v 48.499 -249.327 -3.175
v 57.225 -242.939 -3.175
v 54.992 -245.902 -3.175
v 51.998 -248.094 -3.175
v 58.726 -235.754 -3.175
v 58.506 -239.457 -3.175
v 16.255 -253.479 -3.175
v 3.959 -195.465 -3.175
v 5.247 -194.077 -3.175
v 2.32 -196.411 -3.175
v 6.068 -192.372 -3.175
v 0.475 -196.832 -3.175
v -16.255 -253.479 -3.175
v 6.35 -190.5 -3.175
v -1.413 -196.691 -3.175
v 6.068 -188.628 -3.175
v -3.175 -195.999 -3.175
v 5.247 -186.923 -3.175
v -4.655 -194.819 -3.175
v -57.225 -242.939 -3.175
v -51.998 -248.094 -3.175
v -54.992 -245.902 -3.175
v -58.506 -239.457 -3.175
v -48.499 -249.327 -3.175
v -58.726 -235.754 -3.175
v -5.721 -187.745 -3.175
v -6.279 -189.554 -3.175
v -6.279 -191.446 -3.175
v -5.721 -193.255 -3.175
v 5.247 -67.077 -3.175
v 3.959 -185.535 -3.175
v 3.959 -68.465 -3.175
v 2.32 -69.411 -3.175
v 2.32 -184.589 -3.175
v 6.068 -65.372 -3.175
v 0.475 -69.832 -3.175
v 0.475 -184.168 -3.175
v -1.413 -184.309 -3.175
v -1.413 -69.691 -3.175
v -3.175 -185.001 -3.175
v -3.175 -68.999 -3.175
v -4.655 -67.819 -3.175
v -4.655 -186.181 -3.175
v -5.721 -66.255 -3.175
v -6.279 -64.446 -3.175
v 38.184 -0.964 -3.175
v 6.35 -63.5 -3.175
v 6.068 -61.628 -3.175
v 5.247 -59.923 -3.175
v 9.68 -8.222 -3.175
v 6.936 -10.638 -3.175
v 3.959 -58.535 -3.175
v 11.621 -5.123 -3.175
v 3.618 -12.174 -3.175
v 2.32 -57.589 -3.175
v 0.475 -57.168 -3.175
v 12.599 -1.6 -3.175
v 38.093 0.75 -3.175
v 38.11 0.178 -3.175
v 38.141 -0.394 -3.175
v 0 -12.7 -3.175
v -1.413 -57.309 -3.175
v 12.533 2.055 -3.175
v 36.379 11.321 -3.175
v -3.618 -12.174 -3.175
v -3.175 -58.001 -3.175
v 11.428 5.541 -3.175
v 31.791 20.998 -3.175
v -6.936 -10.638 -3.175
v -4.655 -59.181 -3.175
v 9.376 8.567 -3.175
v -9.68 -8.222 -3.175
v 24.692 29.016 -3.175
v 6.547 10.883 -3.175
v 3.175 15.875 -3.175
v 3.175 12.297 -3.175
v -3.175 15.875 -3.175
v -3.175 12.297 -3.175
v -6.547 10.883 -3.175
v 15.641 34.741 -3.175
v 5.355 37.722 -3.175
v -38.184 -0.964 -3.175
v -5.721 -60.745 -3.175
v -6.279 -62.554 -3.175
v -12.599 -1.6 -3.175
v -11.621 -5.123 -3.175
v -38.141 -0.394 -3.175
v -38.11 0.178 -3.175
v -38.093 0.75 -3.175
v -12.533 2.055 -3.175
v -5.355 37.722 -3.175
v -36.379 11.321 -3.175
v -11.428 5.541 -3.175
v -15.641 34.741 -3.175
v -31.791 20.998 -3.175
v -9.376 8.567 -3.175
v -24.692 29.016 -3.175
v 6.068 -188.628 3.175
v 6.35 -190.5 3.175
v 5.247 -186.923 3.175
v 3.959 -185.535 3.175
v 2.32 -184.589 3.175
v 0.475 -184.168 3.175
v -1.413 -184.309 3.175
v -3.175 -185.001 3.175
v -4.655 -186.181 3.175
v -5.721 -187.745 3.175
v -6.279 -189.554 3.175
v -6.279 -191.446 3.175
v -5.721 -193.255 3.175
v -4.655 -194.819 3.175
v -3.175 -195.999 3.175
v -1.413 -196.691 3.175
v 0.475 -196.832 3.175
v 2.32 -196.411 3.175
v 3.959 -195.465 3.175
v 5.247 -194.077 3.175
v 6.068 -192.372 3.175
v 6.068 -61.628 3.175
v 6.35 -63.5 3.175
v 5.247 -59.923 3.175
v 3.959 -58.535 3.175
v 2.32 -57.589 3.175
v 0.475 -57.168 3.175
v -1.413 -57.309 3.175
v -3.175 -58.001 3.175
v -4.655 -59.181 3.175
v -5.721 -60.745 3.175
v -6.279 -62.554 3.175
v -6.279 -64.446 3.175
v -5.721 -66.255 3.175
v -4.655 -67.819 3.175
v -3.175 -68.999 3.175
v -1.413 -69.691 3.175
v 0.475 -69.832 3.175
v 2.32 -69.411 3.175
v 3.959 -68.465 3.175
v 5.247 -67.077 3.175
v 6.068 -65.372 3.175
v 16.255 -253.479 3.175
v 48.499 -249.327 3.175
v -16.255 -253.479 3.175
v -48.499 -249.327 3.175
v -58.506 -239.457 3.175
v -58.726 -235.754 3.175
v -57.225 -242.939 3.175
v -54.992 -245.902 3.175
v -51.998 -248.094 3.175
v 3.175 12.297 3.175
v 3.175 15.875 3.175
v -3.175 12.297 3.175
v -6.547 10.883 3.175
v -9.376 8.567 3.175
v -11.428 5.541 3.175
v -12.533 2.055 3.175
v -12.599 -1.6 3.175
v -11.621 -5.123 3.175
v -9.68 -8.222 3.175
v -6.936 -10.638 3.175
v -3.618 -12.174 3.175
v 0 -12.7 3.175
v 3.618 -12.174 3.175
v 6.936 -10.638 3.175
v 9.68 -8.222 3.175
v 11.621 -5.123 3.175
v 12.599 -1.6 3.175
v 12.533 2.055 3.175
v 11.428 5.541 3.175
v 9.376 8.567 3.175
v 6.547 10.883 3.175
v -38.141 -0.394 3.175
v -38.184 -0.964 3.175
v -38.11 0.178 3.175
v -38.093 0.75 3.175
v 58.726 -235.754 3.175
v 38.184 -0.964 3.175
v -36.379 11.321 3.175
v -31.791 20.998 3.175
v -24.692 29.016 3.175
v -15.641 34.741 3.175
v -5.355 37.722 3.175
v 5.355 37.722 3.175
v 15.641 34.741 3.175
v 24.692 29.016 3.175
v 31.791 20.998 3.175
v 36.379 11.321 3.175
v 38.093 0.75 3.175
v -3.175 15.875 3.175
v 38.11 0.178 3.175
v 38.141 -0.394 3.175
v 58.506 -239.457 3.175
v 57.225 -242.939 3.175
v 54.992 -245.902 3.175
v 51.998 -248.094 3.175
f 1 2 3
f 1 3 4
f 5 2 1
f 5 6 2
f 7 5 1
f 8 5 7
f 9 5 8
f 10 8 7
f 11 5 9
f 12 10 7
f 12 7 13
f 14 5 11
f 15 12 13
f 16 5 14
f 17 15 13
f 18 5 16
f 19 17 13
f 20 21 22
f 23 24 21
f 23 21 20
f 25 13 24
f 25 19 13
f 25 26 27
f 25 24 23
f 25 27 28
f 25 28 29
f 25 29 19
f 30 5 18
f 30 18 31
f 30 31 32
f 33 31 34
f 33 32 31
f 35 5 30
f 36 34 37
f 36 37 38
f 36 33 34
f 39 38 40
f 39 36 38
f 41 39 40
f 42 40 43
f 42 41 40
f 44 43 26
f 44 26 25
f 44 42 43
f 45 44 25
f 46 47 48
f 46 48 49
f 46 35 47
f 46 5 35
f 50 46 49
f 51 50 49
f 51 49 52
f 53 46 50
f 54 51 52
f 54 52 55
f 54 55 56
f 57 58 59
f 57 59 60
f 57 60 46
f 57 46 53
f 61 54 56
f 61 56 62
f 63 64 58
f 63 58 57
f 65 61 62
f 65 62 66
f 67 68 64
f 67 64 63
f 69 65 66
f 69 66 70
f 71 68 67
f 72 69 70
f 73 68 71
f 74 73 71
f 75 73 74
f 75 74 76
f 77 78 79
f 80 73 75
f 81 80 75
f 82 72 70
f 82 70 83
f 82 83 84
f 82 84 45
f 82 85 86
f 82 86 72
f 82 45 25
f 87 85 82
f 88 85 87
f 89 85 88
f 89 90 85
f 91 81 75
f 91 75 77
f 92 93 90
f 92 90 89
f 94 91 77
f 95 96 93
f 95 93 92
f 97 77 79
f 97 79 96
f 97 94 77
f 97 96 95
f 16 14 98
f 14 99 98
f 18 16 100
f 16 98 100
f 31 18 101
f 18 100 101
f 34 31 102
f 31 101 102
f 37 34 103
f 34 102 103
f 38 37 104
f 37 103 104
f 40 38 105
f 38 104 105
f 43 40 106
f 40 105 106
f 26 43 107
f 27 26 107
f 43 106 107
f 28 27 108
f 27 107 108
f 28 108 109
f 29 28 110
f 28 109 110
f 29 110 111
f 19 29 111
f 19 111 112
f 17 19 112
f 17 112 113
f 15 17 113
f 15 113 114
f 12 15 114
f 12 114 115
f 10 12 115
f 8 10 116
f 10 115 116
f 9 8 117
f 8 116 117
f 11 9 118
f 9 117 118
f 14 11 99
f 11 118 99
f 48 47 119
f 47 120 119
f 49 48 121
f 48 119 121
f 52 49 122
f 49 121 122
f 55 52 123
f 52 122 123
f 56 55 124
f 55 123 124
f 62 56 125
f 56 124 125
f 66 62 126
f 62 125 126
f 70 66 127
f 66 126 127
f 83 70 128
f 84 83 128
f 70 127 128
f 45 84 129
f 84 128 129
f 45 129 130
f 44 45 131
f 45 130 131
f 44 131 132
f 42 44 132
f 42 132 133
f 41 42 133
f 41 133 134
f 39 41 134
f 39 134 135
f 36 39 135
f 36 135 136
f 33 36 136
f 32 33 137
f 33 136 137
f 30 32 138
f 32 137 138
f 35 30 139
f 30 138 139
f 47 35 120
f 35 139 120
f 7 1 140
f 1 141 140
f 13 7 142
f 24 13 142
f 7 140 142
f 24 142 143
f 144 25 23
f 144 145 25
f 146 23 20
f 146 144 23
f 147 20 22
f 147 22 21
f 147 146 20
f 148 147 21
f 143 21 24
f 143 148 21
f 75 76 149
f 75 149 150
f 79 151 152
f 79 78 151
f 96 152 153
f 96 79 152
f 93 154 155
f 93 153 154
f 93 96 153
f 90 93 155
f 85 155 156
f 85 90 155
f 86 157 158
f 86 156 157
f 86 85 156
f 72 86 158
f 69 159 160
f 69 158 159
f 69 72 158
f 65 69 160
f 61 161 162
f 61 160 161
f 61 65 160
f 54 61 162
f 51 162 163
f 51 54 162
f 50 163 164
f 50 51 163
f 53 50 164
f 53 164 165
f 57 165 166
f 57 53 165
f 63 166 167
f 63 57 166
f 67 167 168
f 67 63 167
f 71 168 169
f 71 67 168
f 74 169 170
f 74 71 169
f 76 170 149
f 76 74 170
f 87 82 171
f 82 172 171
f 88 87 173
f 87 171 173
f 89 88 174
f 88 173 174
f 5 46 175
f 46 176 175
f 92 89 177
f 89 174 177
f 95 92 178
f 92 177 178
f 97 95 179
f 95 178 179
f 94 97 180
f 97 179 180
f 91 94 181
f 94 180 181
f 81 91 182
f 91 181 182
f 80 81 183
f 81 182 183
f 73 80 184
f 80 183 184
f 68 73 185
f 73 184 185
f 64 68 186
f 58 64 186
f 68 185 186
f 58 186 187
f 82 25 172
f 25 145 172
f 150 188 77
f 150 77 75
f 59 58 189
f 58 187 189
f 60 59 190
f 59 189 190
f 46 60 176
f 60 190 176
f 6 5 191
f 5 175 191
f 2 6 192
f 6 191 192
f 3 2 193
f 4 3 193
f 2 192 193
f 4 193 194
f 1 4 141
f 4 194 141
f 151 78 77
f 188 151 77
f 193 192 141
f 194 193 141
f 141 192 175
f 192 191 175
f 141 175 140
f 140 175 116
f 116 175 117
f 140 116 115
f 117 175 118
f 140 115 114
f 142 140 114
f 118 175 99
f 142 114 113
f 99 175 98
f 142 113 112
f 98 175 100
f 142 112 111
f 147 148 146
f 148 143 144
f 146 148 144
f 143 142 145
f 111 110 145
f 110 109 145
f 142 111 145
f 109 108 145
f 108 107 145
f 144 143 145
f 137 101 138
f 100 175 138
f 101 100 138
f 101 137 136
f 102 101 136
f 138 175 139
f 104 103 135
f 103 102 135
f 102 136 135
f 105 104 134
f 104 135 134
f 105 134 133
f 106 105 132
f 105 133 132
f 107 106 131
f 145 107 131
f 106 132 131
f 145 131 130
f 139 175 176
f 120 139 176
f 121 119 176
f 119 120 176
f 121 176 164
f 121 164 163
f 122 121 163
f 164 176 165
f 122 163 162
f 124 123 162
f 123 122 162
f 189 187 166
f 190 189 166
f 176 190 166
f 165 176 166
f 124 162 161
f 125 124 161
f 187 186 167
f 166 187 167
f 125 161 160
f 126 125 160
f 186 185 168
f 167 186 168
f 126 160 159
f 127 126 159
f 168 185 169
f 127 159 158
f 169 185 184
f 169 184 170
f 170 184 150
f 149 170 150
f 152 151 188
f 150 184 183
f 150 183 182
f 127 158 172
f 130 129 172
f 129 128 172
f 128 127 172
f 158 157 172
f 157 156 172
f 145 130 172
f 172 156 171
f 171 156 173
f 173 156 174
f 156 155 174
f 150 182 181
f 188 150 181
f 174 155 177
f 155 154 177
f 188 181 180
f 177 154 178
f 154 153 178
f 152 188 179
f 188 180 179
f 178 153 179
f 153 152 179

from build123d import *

# Parameters (mm, degrees)
SKETCH1_R               = 12.7
BOSS_EXTRUDE1_DEPTH     = 3.175
SKETCH8_W               = 6.35
SKETCH8_H               = 6.35
CUT_EXTRUDE1_DEPTH      = 4.175
CUT_EXTRUDE1_DEPTH_BACK = 4.175
SKETCH9_R               = 6.35
CUT_EXTRUDE2_DEPTH      = 4.175
CUT_EXTRUDE2_DEPTH_BACK = 4.175
FILLET1_R               = 12.7


with BuildPart() as part:
    # Sketch1 → Boss-Extrude1 (new body, symmetric)
    with BuildSketch(Plane.XY):
        with BuildLine():
            Line((-59.699595301, -246.884504011), (-38.184359795, -0.964236874))
            ThreePointArc((-38.184359795, -0.964236874), (-38.124009824, -0.108037848), (-38.092623076, 0.749711395))
            ThreePointArc((-38.092623076, 0.749711395), (0, 38.1), (38.092623076, 0.749711395))
            ThreePointArc((38.092623076, 0.749711395), (38.124009824, -0.108037848), (38.184359795, -0.964236874))
            Line((38.184359795, -0.964236874), (59.699595301, -246.884504011))
            ThreePointArc((59.699595301, -246.884504011), (0, -254), (-59.699595301, -246.884504011))
        make_face()
        Circle(SKETCH1_R, mode=Mode.SUBTRACT)
    extrude(amount=BOSS_EXTRUDE1_DEPTH, both=True)

    # Sketch8 → Cut-Extrude1 (cut, two sides)
    with BuildSketch(Plane.XY) as cut_extrude1_sk:
        with Locations((0, 12.7)):
            Rectangle(SKETCH8_W, SKETCH8_H)
    extrude(amount=CUT_EXTRUDE1_DEPTH, mode=Mode.SUBTRACT)
    extrude(cut_extrude1_sk.sketch, amount=-CUT_EXTRUDE1_DEPTH_BACK, mode=Mode.SUBTRACT)

    # Sketch9 → Cut-Extrude2 (cut, two sides)
    with BuildSketch(Plane.XY) as cut_extrude2_sk:
        with Locations((0, -63.5)):
            Circle(SKETCH9_R)
        with Locations((0, -190.5)):
            Circle(SKETCH9_R)
    extrude(amount=CUT_EXTRUDE2_DEPTH, mode=Mode.SUBTRACT)
    extrude(cut_extrude2_sk.sketch, amount=-CUT_EXTRUDE2_DEPTH_BACK, mode=Mode.SUBTRACT)

    # Fillet1
    fillet1_edges = [part.edges().sort_by_distance(p)[0] for p in [
        (-59.699595301, -246.884504011, 0),
        (59.699595301, -246.884504011, 0),
    ]]
    fillet(fillet1_edges, radius=FILLET1_R)


solid = part.part
